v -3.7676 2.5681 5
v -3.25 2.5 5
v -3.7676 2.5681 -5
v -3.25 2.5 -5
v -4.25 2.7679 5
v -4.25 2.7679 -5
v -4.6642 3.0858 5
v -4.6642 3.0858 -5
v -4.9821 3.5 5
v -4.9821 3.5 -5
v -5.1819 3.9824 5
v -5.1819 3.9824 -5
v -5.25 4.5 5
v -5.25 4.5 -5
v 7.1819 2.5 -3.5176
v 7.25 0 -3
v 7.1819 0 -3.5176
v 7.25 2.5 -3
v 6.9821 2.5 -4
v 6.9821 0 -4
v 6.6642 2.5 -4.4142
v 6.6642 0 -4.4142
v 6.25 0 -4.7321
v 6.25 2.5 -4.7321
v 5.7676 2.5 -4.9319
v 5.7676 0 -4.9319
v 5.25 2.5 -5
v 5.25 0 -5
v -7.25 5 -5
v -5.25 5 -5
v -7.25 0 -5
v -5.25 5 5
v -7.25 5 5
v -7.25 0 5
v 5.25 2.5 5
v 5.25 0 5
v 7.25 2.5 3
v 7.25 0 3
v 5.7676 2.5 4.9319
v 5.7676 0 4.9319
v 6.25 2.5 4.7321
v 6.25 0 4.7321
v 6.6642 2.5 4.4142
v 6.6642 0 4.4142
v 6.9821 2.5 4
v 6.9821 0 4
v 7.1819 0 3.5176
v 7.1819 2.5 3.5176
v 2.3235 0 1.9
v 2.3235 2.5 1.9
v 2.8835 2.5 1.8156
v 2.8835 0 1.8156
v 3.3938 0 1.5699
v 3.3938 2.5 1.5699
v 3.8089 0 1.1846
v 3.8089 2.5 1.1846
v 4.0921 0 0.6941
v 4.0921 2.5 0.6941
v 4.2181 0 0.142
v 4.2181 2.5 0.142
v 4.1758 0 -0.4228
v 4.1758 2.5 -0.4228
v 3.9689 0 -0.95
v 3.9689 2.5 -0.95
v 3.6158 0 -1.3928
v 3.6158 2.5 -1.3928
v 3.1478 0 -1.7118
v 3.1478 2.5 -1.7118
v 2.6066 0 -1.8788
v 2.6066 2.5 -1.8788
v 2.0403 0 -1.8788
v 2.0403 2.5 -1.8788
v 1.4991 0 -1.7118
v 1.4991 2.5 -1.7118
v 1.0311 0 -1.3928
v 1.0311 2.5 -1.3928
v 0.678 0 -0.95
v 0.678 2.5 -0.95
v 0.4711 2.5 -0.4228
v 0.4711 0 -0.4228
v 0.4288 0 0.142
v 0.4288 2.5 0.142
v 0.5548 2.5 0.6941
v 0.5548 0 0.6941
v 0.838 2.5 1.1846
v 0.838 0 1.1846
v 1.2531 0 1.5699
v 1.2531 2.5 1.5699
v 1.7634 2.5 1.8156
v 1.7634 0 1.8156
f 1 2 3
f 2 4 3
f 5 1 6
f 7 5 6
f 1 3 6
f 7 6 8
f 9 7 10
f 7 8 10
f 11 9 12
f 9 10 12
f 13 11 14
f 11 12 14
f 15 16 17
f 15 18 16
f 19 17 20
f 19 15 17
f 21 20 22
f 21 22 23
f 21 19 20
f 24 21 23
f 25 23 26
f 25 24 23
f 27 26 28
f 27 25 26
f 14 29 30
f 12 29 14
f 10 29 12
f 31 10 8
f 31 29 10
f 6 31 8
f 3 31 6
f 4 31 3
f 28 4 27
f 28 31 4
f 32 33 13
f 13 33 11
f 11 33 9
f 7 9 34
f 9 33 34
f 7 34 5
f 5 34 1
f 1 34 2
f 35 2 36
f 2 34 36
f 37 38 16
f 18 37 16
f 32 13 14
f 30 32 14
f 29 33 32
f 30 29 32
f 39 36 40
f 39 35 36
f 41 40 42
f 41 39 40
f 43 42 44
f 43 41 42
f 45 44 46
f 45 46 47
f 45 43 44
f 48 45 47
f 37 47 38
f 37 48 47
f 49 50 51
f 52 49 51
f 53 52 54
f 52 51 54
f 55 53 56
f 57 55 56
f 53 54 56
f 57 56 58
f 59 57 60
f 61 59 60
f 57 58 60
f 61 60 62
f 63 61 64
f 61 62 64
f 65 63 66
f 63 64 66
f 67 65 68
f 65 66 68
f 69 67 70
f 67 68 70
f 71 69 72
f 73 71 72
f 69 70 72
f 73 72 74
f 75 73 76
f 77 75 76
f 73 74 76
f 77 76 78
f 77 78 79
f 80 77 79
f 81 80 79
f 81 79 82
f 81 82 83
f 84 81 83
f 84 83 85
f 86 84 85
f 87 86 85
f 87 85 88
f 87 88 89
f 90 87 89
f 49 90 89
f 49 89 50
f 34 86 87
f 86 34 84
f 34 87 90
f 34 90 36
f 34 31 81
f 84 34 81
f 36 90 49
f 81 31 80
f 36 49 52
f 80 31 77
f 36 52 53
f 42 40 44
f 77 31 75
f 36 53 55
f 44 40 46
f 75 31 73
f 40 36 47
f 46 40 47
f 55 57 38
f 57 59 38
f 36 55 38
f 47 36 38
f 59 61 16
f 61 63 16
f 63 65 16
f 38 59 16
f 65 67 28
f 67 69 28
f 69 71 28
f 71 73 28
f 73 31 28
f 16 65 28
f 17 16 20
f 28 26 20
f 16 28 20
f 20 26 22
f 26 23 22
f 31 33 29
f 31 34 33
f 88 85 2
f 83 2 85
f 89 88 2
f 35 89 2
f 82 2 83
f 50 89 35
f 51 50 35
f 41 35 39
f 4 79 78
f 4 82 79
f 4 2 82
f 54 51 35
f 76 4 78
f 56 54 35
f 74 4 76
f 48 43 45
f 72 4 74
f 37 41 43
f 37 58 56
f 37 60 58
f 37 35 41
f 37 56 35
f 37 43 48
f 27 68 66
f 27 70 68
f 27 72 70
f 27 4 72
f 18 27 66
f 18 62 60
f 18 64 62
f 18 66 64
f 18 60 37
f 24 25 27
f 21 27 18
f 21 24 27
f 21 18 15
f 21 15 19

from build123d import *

# Parameters (mm, degrees)
SKETCH1_W           = 14.5
SKETCH1_H           = 10
BOSS_EXTRUDE1_DEPTH = 2.5
SKETCH2_R           = 1.9
CUT_EXTRUDE1_DEPTH  = 10.154916712
SKETCH3_W           = 2
SKETCH3_H           = 10
BOSS_EXTRUDE2_DEPTH = 2.5
FILLET1_R           = 2
FILLET2_R           = 2


with BuildPart() as part:
    # Sketch1 → Boss-Extrude1 (new body)
    with BuildSketch(Plane(origin=(0, 0, 0), x_dir=(1, 0, 0), z_dir=(0, 1, 0))):
        Rectangle(SKETCH1_W, SKETCH1_H)
    extrude(amount=BOSS_EXTRUDE1_DEPTH)

    # Sketch2 → Cut-Extrude1 (cut, through all)
    with BuildSketch(Plane(origin=(0, 2.5, 0), x_dir=(1, 0, 0), z_dir=(0, 1, 0))):
        with Locations(Location((2.323455921, 0, 0), (0, 0, 270))):
            Circle(SKETCH2_R)
    extrude(amount=-CUT_EXTRUDE1_DEPTH, mode=Mode.SUBTRACT)

    # Sketch3 → Boss-Extrude2 (add)
    with BuildSketch(Plane(origin=(0, 2.5, 0), x_dir=(1, 0, 0), z_dir=(0, 1, 0))):
        with Locations((-6.25, 0)):
            Rectangle(SKETCH3_W, SKETCH3_H)
    extrude(amount=BOSS_EXTRUDE2_DEPTH)

    # Fillet1
    fillet1_edges = [part.edges().sort_by_distance(p)[0] for p in [
        (-5.25, 2.5, 0),
    ]]
    fillet(fillet1_edges, radius=FILLET1_R)

    # Fillet2
    fillet2_edges = [part.edges().sort_by_distance(p)[0] for p in [
        (7.25, 1.25, 5),
        (7.25, 1.25, -5),
    ]]
    fillet(fillet2_edges, radius=FILLET2_R)


solid = part.part
